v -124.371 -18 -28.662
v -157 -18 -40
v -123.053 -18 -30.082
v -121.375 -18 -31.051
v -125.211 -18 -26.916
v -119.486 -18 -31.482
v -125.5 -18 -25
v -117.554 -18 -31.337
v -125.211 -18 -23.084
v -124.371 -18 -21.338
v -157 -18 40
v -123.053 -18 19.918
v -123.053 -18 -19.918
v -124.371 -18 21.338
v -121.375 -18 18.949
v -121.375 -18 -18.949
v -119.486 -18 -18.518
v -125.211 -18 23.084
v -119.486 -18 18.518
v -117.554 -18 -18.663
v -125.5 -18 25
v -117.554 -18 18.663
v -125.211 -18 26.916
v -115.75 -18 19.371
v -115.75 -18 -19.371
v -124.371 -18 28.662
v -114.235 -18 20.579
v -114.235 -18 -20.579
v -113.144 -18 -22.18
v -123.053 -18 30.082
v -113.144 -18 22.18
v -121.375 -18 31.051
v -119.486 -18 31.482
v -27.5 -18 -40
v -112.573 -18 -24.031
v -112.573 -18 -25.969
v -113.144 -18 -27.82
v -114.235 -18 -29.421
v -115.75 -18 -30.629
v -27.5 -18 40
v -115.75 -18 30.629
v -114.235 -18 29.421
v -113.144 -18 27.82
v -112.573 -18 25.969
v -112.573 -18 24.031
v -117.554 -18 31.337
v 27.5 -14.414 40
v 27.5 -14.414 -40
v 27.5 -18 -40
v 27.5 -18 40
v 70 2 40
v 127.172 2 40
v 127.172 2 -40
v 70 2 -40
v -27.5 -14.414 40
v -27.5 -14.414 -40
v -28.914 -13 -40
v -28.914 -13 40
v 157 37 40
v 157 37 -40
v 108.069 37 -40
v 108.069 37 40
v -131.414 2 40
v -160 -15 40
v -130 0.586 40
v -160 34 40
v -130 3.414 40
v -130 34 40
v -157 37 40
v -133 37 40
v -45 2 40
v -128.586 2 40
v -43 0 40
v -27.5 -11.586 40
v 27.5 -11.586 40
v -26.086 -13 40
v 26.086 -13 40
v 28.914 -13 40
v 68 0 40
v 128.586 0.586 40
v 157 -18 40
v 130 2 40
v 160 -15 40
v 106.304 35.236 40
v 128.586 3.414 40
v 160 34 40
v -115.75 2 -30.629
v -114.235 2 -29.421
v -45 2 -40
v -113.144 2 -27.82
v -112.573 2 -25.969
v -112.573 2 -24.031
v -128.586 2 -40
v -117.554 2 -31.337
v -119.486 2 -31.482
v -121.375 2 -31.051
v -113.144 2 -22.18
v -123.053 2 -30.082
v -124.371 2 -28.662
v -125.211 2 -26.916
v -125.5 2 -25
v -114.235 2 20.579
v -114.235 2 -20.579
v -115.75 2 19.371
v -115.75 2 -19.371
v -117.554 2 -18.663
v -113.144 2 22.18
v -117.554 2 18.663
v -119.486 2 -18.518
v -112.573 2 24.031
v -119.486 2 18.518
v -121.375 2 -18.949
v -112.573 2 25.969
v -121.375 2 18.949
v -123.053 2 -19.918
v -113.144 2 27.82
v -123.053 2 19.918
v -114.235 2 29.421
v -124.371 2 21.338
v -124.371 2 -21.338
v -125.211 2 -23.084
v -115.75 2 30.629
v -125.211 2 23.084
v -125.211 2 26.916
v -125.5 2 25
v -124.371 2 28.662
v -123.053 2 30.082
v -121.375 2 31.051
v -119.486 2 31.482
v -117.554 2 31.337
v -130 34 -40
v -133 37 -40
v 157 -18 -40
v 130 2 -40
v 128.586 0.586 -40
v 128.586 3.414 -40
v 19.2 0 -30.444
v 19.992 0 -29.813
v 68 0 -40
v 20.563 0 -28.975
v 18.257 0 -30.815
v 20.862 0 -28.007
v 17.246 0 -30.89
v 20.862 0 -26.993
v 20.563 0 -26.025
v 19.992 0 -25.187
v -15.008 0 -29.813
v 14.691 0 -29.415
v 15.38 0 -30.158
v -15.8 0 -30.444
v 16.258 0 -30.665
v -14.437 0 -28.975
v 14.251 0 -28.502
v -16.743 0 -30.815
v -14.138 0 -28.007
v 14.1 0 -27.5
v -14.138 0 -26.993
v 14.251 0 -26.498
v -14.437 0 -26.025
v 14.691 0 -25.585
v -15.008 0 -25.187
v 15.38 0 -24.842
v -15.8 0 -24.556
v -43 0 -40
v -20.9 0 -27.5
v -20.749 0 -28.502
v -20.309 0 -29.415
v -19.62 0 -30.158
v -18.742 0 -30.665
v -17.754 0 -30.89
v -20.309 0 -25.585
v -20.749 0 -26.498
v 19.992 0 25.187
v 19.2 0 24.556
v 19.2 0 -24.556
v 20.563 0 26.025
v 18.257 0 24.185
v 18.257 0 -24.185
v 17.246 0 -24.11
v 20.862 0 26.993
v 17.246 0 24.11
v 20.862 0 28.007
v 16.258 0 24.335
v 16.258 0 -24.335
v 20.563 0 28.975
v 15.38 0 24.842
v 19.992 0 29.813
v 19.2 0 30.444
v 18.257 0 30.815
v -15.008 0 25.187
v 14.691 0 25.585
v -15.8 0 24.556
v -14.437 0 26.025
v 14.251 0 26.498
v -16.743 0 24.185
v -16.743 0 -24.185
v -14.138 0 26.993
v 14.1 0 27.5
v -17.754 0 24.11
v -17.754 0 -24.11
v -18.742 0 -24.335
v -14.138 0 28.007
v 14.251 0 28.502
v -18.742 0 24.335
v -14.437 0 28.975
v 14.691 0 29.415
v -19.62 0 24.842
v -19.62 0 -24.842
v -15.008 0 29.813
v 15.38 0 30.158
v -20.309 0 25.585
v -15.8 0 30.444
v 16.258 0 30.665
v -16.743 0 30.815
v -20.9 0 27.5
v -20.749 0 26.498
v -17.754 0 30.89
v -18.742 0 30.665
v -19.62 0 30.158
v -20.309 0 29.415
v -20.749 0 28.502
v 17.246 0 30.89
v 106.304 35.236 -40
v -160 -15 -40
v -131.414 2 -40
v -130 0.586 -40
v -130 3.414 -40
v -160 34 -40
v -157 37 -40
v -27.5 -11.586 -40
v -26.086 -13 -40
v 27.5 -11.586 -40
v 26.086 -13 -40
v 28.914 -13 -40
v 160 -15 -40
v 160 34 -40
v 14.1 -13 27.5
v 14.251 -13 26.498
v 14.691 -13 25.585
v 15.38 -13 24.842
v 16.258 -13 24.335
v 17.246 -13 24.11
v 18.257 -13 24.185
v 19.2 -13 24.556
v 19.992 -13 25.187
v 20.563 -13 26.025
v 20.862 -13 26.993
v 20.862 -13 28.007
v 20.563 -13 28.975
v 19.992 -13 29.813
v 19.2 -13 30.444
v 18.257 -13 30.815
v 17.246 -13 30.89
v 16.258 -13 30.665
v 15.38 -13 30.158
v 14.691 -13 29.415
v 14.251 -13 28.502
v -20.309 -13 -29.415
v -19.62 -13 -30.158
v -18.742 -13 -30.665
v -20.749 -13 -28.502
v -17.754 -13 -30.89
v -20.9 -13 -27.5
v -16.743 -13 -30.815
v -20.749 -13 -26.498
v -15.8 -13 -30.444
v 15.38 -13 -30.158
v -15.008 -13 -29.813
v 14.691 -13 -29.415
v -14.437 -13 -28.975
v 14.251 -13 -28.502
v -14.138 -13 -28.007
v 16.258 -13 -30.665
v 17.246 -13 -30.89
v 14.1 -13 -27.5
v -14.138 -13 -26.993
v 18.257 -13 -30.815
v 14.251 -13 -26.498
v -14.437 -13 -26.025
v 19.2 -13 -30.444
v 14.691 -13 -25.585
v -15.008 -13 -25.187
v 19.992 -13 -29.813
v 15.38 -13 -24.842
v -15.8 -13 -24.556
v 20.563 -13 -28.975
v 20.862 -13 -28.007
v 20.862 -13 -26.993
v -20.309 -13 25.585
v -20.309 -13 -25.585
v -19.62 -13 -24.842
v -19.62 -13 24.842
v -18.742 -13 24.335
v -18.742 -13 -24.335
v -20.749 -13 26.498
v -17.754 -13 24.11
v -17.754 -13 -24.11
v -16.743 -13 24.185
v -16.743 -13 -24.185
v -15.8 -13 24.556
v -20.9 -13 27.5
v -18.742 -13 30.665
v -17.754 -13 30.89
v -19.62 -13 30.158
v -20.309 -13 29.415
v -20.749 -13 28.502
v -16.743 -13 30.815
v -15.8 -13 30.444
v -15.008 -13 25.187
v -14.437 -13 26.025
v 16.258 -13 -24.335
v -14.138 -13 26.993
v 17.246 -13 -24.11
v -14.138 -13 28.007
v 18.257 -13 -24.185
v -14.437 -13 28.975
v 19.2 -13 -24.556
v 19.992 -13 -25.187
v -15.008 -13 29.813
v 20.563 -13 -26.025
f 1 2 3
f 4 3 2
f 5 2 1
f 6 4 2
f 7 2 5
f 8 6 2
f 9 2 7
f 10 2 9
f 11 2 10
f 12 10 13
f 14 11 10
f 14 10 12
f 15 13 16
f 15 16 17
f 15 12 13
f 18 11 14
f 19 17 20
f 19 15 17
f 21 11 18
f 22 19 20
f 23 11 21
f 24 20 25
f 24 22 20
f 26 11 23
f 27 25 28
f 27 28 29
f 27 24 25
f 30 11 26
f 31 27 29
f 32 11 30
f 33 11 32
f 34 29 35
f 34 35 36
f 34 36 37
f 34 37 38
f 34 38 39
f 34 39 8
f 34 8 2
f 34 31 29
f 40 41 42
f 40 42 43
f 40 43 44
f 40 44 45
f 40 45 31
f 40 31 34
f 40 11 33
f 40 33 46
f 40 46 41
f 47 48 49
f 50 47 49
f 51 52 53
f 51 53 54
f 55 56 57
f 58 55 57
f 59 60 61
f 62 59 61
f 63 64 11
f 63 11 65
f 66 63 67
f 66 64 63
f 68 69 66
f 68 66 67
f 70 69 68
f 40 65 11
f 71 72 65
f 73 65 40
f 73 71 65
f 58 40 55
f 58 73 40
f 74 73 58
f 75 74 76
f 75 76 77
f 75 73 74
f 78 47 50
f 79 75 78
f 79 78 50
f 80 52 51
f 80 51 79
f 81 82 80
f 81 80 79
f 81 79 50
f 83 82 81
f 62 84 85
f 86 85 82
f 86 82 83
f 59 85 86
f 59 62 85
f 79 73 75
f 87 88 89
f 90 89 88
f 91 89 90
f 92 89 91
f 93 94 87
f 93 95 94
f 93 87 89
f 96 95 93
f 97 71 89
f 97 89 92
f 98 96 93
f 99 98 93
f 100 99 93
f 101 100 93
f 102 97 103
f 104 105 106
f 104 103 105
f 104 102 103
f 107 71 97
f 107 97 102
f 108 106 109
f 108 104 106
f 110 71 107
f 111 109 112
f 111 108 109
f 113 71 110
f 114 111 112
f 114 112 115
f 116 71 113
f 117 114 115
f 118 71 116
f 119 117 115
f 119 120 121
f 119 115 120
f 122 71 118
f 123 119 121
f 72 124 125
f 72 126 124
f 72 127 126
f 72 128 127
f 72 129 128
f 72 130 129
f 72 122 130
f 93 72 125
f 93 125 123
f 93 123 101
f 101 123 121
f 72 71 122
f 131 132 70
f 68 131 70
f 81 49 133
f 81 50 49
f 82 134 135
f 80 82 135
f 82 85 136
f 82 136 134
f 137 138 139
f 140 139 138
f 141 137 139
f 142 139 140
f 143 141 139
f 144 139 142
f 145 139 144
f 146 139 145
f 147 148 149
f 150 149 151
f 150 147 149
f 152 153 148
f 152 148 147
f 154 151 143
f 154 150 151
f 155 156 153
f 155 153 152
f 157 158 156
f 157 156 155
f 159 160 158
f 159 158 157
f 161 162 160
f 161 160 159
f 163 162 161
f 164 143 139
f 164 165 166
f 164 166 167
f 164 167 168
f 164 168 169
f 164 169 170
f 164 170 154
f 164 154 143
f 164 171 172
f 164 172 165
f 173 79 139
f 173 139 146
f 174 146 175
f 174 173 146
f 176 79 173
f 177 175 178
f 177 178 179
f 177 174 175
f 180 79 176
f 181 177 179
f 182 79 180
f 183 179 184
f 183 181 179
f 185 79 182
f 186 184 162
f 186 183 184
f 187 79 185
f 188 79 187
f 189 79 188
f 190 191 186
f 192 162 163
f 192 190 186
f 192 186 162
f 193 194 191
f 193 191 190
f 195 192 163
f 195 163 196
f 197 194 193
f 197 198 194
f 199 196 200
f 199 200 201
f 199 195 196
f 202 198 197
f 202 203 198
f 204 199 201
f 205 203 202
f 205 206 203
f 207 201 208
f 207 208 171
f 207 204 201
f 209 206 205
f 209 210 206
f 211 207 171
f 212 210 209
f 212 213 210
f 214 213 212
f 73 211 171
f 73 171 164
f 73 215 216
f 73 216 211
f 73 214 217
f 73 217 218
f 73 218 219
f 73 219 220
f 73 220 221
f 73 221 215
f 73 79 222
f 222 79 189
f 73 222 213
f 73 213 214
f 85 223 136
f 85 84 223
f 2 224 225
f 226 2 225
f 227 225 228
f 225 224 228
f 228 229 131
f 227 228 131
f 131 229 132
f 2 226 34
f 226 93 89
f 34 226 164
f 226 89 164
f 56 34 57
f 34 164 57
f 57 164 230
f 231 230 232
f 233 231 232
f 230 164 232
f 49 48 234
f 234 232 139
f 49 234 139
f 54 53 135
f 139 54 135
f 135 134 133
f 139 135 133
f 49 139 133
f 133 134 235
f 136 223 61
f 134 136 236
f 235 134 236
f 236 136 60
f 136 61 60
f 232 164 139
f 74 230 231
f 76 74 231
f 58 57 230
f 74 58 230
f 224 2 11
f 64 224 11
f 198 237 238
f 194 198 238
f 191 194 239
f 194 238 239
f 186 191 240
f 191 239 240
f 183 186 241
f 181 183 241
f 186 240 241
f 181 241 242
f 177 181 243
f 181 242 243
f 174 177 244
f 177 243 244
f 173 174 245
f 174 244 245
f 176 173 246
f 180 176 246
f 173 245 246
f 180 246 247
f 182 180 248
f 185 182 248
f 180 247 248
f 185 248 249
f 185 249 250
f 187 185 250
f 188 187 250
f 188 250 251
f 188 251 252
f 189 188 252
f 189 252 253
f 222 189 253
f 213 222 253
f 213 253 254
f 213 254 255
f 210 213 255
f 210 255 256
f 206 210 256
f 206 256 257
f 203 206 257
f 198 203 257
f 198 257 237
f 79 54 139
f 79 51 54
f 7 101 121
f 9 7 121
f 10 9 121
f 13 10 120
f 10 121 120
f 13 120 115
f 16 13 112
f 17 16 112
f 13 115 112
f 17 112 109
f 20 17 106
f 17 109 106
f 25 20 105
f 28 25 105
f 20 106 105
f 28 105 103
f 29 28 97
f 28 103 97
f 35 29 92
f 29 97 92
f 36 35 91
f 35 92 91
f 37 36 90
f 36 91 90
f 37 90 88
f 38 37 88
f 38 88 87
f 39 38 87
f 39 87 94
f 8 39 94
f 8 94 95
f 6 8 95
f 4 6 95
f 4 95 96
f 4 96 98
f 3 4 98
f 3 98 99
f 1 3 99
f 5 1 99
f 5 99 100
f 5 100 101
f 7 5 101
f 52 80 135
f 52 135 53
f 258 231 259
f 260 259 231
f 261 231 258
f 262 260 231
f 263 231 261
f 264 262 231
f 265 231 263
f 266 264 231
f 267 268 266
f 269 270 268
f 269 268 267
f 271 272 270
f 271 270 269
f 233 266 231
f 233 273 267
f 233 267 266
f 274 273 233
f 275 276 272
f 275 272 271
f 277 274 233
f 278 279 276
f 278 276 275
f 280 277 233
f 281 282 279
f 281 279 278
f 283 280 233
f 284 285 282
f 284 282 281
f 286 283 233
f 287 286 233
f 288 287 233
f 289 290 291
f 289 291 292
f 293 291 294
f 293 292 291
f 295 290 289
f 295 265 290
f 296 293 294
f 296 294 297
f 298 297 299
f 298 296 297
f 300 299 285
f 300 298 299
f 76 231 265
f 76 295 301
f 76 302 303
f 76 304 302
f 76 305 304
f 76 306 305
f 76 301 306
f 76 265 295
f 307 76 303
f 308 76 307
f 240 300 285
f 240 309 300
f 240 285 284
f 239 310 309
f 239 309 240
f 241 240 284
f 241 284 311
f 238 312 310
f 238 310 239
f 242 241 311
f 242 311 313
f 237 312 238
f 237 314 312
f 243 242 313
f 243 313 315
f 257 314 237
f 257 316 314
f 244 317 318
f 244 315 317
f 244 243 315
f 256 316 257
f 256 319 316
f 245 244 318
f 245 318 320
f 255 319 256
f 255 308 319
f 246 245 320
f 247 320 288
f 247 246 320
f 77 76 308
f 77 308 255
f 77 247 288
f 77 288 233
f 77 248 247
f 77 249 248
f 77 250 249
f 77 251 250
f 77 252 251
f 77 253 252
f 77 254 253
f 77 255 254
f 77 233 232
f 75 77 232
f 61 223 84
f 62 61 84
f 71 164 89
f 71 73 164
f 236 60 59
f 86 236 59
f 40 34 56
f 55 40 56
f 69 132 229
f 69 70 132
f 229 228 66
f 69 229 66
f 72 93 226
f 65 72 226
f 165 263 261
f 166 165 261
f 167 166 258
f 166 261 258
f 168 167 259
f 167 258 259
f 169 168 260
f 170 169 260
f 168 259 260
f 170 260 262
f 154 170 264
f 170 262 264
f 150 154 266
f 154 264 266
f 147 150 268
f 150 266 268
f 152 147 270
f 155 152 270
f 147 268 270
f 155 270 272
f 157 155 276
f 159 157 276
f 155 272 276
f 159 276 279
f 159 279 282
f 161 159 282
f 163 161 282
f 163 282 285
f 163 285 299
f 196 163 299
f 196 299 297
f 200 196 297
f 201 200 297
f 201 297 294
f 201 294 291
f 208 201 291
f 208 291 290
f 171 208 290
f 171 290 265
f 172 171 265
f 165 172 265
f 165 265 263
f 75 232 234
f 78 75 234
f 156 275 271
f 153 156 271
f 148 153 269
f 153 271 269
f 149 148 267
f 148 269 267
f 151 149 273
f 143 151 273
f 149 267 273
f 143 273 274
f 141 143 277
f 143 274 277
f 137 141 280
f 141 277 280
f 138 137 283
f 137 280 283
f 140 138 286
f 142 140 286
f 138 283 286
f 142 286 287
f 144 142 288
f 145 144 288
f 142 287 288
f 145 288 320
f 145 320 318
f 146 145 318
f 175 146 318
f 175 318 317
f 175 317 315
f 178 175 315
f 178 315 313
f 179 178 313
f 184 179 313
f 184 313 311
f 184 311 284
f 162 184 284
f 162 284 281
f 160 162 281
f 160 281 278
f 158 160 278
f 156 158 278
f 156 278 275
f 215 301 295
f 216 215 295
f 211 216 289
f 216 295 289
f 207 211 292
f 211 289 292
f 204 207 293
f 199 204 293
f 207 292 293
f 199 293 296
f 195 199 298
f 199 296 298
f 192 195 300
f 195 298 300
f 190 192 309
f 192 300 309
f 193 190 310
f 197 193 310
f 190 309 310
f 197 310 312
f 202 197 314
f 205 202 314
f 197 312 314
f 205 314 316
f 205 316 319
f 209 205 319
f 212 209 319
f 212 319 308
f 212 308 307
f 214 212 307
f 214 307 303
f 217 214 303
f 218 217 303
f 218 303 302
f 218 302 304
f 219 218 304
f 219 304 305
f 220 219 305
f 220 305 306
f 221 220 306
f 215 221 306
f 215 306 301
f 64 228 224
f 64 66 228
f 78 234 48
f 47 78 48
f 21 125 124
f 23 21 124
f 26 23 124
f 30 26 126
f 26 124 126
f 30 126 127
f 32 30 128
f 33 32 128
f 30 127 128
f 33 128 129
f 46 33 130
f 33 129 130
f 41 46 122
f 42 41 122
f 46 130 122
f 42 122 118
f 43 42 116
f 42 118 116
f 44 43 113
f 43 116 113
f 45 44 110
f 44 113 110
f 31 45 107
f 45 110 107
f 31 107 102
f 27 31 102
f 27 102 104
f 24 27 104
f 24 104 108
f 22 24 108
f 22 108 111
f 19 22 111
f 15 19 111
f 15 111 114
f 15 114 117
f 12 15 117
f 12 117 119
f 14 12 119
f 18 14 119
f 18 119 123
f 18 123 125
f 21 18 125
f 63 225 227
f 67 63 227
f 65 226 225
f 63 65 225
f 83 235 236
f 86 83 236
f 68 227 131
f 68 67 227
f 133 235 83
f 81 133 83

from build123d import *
from OCP.BRepFilletAPI import BRepFilletAPI_MakeChamfer

# Parameters (mm, degrees)
EXTRUDE_1_DEPTH        = 40
SKETCH_2_R             = 6.5
CUT_EXTRUDE_1_DEPTH    = 80
CHAMFER_1_SIZE         = 3
CHAMFER_1_SIZE2        = 2.154045129
HOLE_WIZARD_M8_1_D     = 6.8
HOLE_WIZARD_M8_1_DEPTH = 17.707073895
HOLE_WIZARD_M8_1_TIP   = 2.042926105


with BuildPart() as part:
    # 草图1 → 凸台-拉伸1 (new, symmetric)
    with BuildSketch(Plane.XY):
        Polygon((0, 0), (-43, 0), (-45, 2), (-128.585786438, 2), (-130, 0.585786438), (-131.414213562, 2), (-130, 3.414213562), (-130, 37), (-160, 37), (-160, -18), (-27.5, -18), (-27.5, -14.414213562), (-28.914213562, -13), (-27.5, -11.585786438), (-26.085786438, -13), (26.085786438, -13), (27.5, -11.585786438), (28.914213562, -13), (27.5, -14.414213562), (27.5, -18), (160, -18), (160, 37), (105.068765597, 37), (128.585786438, 3.414213562), (130, 2), (128.585786438, 0.585786438), (127.171572875, 2), (70, 2), (68, 0), align=None)
    extrude(amount=EXTRUDE_1_DEPTH, both=True)

    # 草图2 → 切除-拉伸1 (cut)
    with BuildSketch(Plane(origin=(0, 2, 0), x_dir=(1, 0, 0), z_dir=(0, 1, 0))):
        with Locations(Location((-119, 25, 0), (0, 0, 180))):
            Circle(SKETCH_2_R)
        with Locations(Location((-119, -25, 0), (0, 0, 180))):
            Circle(SKETCH_2_R)
    extrude(amount=-CUT_EXTRUDE_1_DEPTH, mode=Mode.SUBTRACT)

    # 倒角1: one chamfer whose edges measure the first distance from different faces: ONE call of the kernel's chamfer builder (chamfer() names one face for all edges)
    chamfer_1_edges_1 = [part.edges().sort_by_distance(p)[0] for p in [
        (105.068765597, 37, 0),
    ]]
    chamfer_1_side_1 = [part.faces().sort_by_distance(p)[0] for p in [
        (132.534382799, 37, 0),
    ]]
    chamfer_1_edges_2 = [part.edges().sort_by_distance(p)[0] for p in [
        (160, 37, 0),
        (160, -18, 0),
        (-160, -18, 0),
        (-160, 37, 0),
        (-130, 37, 0),
    ]]
    chamfer_1 = BRepFilletAPI_MakeChamfer(part.part.solid().wrapped)
    for e in chamfer_1_edges_1:
        chamfer_1.Add(CHAMFER_1_SIZE, CHAMFER_1_SIZE2, e.wrapped, chamfer_1_side_1[0].wrapped)  # the first distance lies on this face
    for e in chamfer_1_edges_2:
        chamfer_1.Add(CHAMFER_1_SIZE, e.wrapped)
    add(Compound.cast(chamfer_1.Shape()), mode=Mode.REPLACE)

    # M8 螺纹孔1
    with Locations(Plane(origin=(-17.5, 0, -27.5), x_dir=(1, 0, 0), z_dir=(0, 1, 0))):
        with Locations((0, 0), (35, 0), (35, -55), (0, -55)):
            Hole(HOLE_WIZARD_M8_1_D / 2, depth=HOLE_WIZARD_M8_1_DEPTH)
            with Locations((0, 0, -(HOLE_WIZARD_M8_1_DEPTH + HOLE_WIZARD_M8_1_TIP / 2))):  # 118° drill point
                Cone(0, HOLE_WIZARD_M8_1_D / 2, HOLE_WIZARD_M8_1_TIP, mode=Mode.SUBTRACT)


solid = part.part
